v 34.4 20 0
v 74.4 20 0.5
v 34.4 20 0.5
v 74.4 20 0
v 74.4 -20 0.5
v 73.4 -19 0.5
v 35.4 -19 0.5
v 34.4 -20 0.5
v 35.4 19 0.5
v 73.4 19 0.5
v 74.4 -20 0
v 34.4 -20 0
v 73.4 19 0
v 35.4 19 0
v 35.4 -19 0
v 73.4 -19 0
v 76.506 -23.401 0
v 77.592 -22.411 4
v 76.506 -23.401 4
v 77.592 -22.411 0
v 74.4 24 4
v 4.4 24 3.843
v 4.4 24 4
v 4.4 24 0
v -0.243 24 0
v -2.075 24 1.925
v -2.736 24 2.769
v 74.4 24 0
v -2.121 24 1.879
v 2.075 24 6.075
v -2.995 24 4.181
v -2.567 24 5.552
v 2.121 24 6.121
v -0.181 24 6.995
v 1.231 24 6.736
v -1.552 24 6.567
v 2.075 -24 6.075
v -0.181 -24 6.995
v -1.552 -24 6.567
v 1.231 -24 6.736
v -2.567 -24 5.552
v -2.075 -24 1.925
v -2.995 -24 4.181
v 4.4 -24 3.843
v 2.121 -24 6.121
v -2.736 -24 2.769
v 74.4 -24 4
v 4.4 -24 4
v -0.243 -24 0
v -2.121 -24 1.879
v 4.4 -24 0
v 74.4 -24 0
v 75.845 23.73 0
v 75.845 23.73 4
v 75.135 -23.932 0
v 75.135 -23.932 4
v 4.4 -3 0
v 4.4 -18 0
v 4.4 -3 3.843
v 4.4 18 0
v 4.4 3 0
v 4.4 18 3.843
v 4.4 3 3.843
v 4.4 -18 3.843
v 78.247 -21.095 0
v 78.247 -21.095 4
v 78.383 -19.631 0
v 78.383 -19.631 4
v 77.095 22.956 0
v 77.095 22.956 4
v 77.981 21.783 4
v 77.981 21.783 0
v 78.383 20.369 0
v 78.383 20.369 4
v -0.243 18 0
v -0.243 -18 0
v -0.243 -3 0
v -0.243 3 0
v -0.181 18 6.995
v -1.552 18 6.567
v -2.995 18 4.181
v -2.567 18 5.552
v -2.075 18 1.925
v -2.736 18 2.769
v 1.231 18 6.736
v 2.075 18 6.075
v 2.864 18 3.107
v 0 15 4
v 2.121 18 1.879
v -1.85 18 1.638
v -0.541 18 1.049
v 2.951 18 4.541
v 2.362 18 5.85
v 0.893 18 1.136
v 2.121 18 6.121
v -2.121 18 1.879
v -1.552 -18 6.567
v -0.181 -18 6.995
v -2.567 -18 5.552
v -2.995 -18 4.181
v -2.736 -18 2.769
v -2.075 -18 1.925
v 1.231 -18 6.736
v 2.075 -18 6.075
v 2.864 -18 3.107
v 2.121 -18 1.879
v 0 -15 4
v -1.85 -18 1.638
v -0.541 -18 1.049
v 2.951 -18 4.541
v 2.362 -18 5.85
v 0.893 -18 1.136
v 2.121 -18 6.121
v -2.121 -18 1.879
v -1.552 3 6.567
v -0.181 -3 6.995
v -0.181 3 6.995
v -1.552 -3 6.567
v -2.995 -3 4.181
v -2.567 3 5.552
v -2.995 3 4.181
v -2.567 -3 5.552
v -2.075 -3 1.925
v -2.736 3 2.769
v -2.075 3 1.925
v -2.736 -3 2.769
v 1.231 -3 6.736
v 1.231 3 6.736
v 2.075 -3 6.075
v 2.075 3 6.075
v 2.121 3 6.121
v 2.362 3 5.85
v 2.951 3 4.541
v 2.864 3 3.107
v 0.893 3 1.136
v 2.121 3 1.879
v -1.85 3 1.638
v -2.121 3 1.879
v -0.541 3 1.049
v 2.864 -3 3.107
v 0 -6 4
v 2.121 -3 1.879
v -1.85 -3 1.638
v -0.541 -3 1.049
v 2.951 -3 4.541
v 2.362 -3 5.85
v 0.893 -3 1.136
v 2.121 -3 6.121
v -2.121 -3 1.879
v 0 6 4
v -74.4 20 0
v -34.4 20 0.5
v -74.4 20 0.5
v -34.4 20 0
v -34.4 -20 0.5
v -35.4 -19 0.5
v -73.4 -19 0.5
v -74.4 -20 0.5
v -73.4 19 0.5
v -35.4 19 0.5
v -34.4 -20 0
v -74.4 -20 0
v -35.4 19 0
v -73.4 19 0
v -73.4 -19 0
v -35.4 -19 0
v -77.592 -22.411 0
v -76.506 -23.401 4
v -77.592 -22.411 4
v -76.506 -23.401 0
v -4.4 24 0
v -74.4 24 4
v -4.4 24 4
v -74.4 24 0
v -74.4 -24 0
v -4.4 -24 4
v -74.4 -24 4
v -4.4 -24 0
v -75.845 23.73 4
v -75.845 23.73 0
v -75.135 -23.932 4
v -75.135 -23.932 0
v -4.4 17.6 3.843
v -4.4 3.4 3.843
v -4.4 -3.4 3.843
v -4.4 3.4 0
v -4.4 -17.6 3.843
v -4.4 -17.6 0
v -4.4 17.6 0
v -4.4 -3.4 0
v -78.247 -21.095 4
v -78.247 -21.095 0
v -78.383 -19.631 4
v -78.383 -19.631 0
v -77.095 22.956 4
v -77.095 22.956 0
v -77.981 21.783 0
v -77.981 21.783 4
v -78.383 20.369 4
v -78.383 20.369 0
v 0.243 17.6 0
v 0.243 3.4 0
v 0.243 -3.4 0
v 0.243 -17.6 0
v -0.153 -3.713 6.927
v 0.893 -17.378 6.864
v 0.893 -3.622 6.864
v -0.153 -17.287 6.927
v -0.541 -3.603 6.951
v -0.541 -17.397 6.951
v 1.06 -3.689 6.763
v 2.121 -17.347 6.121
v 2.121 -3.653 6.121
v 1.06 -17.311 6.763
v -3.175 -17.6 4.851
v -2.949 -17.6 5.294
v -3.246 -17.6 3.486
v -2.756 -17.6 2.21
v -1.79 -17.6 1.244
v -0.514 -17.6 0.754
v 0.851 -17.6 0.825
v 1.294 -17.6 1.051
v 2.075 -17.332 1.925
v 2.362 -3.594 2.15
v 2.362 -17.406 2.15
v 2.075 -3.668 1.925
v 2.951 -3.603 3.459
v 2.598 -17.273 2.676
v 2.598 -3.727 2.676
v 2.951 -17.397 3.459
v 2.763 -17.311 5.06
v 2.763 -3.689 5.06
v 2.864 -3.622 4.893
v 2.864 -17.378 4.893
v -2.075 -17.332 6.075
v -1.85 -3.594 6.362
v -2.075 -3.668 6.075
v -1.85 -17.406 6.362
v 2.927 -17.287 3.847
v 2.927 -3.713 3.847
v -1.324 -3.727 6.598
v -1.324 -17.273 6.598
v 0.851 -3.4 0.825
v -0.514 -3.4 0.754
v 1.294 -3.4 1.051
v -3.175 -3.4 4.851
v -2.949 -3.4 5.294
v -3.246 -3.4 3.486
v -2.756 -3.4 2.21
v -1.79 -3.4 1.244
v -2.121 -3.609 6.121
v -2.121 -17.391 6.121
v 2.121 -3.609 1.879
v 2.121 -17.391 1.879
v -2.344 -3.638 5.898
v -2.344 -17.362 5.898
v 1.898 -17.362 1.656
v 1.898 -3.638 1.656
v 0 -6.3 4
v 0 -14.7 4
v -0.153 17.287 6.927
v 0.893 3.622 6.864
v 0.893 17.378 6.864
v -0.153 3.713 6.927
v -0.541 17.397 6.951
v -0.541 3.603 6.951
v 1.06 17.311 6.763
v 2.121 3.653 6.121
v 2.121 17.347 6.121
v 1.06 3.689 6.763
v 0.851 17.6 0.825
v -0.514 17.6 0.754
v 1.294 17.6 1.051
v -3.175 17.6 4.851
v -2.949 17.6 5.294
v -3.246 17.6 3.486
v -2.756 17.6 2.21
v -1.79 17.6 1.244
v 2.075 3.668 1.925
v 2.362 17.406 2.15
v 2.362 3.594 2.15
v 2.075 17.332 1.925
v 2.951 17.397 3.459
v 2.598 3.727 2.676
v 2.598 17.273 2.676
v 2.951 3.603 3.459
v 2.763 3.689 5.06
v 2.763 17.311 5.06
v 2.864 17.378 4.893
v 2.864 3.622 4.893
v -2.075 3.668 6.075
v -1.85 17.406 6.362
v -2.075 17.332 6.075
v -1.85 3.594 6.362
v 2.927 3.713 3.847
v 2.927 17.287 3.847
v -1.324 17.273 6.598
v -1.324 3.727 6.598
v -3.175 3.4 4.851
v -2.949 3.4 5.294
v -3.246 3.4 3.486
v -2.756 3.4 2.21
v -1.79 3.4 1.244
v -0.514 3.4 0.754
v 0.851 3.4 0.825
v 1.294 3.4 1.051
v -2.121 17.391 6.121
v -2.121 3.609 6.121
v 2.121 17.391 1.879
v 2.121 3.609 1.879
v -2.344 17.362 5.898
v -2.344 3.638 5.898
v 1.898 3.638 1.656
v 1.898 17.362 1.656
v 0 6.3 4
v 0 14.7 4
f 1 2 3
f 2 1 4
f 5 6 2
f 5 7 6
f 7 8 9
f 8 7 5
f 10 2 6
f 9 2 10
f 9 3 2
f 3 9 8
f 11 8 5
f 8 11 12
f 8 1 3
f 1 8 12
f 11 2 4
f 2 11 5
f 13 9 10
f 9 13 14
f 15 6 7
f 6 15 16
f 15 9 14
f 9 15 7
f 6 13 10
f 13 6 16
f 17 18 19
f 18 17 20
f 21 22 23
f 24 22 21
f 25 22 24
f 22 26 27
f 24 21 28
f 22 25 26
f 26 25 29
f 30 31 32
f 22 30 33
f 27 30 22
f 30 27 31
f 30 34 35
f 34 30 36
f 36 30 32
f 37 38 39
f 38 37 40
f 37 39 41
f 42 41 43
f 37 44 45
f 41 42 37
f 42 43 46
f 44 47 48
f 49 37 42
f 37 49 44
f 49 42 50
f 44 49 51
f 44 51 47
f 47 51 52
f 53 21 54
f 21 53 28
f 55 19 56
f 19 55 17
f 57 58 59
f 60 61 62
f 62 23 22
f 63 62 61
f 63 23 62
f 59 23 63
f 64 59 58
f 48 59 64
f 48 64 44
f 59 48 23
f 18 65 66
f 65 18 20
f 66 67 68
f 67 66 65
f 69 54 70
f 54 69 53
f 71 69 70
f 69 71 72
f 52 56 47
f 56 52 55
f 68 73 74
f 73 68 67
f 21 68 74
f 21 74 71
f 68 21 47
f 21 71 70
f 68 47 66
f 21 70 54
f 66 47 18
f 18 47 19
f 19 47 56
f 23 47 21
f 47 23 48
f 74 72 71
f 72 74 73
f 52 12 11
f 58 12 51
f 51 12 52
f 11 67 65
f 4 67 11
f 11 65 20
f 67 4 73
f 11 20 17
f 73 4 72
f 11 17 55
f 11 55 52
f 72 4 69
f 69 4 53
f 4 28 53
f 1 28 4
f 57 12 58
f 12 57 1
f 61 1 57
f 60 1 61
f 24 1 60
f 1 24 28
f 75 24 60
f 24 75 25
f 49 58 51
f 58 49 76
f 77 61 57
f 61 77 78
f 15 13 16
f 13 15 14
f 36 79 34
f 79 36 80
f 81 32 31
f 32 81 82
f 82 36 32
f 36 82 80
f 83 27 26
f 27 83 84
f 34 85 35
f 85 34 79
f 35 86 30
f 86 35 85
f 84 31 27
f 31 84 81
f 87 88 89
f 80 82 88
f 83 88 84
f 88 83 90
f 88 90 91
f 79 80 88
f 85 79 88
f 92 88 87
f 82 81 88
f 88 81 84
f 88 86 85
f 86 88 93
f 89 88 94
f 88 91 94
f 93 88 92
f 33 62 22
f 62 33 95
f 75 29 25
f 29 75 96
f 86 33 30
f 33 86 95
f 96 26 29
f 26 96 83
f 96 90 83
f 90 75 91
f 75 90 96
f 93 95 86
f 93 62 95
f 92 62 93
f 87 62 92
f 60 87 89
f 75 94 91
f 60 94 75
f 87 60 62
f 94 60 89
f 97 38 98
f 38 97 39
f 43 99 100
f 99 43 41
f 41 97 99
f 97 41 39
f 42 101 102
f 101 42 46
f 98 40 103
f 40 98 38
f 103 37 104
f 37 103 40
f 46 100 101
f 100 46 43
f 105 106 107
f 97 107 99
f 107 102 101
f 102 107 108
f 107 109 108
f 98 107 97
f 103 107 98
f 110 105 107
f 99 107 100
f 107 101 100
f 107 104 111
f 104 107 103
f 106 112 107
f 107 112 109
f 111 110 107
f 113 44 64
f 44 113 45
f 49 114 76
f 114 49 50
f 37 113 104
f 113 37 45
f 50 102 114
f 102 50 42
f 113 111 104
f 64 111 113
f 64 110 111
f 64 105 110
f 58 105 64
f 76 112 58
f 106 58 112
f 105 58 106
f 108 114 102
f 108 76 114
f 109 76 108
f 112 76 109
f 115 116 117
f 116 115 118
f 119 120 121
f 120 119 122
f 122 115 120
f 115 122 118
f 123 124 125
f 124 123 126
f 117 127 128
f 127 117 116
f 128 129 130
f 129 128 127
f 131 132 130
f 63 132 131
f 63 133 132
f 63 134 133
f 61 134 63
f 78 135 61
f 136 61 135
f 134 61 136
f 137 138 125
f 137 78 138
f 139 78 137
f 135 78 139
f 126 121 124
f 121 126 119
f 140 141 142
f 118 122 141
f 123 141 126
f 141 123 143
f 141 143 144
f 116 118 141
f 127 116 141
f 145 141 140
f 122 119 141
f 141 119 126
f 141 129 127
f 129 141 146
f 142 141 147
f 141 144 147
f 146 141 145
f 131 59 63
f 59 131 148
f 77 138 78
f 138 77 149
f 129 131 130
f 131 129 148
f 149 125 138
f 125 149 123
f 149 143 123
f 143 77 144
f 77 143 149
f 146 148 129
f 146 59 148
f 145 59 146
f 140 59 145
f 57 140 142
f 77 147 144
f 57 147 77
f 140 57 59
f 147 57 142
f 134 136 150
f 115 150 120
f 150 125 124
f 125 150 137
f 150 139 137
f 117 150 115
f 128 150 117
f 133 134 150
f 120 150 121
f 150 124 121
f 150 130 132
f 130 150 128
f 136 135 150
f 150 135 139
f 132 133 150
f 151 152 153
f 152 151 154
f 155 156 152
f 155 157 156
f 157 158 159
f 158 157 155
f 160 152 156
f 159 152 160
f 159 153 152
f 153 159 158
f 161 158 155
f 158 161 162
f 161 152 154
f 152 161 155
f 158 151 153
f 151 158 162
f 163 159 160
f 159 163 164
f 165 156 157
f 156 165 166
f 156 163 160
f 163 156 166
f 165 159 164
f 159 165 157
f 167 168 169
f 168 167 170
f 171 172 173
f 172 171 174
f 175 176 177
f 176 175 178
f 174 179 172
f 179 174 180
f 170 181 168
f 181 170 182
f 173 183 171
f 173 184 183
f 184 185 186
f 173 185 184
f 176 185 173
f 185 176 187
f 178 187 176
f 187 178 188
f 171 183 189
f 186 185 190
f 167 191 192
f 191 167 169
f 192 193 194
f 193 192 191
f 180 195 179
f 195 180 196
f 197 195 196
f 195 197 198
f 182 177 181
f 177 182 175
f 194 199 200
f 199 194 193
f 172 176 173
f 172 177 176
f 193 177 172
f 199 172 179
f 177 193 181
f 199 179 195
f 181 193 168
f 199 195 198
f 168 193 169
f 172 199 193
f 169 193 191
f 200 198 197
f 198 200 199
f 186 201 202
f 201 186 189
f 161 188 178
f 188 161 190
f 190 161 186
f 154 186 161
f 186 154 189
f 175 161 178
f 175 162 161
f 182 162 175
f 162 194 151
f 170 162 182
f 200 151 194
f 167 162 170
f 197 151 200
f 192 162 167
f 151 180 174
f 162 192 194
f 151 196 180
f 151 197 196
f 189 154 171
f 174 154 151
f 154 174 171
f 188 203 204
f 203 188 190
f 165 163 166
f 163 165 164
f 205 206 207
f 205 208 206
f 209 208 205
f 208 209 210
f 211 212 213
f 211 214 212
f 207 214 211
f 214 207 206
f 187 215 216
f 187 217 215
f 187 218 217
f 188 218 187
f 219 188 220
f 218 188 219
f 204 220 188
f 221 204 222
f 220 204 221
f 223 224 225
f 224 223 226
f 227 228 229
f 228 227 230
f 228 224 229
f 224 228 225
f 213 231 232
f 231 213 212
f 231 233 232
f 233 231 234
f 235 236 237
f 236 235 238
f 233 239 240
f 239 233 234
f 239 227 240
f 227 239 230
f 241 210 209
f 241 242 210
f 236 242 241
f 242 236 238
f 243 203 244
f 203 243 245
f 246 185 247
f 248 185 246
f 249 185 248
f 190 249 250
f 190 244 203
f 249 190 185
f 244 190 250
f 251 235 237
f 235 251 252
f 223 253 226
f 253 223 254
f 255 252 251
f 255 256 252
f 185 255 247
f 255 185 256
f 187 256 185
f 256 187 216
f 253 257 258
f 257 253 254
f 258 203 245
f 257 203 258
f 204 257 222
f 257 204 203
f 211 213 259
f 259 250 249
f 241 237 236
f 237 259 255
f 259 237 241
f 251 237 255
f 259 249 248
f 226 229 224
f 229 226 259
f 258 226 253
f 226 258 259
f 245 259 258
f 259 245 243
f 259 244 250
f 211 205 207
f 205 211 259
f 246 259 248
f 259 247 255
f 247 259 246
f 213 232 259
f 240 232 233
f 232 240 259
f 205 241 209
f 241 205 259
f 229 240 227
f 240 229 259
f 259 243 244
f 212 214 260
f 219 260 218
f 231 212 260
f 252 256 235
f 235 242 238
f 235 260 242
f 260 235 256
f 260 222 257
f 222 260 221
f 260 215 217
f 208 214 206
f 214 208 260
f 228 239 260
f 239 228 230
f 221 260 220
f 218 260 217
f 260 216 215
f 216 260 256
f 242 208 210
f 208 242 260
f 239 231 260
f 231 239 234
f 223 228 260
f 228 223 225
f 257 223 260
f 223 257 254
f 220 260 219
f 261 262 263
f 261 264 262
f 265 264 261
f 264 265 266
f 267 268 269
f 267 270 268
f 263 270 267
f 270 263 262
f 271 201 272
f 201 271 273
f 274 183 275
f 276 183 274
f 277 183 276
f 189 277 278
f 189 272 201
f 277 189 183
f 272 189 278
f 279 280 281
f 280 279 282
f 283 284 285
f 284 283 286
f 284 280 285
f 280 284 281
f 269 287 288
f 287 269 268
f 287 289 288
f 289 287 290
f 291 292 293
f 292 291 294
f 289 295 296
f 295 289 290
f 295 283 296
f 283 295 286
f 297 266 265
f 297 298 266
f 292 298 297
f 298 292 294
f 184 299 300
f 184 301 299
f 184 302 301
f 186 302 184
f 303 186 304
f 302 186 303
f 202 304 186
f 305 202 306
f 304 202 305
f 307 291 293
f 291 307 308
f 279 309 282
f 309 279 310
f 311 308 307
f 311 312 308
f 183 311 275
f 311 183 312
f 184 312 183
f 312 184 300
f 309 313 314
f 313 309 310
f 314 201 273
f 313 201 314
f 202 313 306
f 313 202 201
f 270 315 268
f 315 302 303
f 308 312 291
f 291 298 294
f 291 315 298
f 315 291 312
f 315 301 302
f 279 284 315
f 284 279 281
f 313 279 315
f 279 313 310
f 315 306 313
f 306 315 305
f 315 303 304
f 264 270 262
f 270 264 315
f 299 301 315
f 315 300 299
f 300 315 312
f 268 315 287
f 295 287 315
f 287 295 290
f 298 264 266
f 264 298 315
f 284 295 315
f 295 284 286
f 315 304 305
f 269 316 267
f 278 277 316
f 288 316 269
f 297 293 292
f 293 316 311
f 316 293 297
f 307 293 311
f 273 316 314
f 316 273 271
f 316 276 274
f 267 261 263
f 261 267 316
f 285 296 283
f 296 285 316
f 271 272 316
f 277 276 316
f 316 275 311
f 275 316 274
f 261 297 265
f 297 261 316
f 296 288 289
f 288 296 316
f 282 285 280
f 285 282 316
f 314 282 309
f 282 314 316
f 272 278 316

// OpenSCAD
// [FL_INDEX: keywords="openscad, 3d_parametric, Customizable_Embossing_Stamp, csg_solid" | COT="Parametric OpenSCAD design from 3DCodeverse"]
// Title: Customizable Embossing Stamp

// preview[view:south, tilt:top]

/* [Global] */

// Load a 100x100 pixel image.(images will be stretched to fit) Simple, high contrast images work best. Make sure to click the Invert Colors checkbox!
image_file = "smile.dat"; // [image_surface:100x100]

// Where would you like the hinge in relation to your image?
hinge_placement = 1; // [1:top,2:left,3:bottom,4:right]

// What height would you like for the embossed area (mm)?
emboss_height = 1.5;

/* [Hidden] */
$fa = 6;
$fs = 1.5;
image_width = 40;
image_length = 40;
image_padding = 4;

handle_width = image_width + image_padding*2;
handle_length = 70;
handle_height = emboss_height+2.5;
nub = 3; // hinge size
tol = 0.4; // spacing between hinge pieces

assembly();

module assembly() {
    stamp_top(90*hinge_placement);
    stamp_bottom(90*hinge_placement);   
}

module stamp_top(rot=90) {
    translate([1,0,0])
    union() {
        difference () {
            translate([handle_length + nub + tol, -handle_width/2, 0])
                rotate([0,0,90]) handle();
            translate([handle_length-image_length/2+nub+tol,0,handle_height]) 
                rotate([0,180,rot]) plate();
        }
    
        // hinge
        translate([-1,handle_width/2-2*nub,handle_height]) hinge_m();
        mirror([0,1,0]) translate([-1,handle_width/2-2*nub,handle_height]) hinge_m();
        translate([-1,-nub,handle_height]) hinge_m();
        mirror([0,1,0]) translate([-1,-nub,handle_height]) hinge_m();
    }
}

module stamp_bottom(rot=90) {
    translate([-1,0,0])
    union() {
        translate([-handle_length + image_length/2-nub-tol,0,handle_height]) 
            rotate([0,0,-rot]) plate();
        mirror([1,0,0]) translate([handle_length + nub + tol, -handle_width/2, 0]) 
            rotate([0,0,90]) handle();
        
        // hinge
        translate([1,-nub-tol,handle_height]) hinge_f();
        mirror([0,1,0]) translate([1,-nub-tol,handle_height]) hinge_f();
    }
}

module handle() {
    difference() {
        hull() {
            cube([handle_width, handle_length, handle_height]);
            translate([image_padding,0,0]) cylinder(r=image_padding, h=handle_height);
            translate([handle_width-image_padding,0,0]) cylinder(r=image_padding, h=handle_height);
        }
        guide();
    }

}

module guide() {
    translate([image_padding,0,-.5]) 
    difference() {
        cube([image_width, image_length, 1]);
        translate([1,1,-0.5]) cube([image_width-2, image_length-2, 2]);
    }
}

module hinge_m() {
    difference () {
    	rotate([0,45,0]) union(){
            translate([0,0,-nub]) cube ([nub*3,nub*2, nub*2]);
            rotate([90,0,0]) {
                translate([0,0,-2*nub]) cylinder(r=nub,h=2*nub);
    		    cylinder(r1=nub,r2=0,h=nub);
            }
    	}
        translate([-nub,-nub/2,-handle_height-nub*5]) cube([nub*5, nub*3, nub*5]);
    }
}

module hinge_f() {
    len = handle_width/2 - 3*nub - 2*tol;
    
    difference() {
        rotate([90,-45,0]) 
        difference() {
            union() {
                cylinder(r=nub, h=len);
                translate([-3*nub,-nub,0]) cube([nub*3,nub*2,len]);
            }
            translate([0,0,-0.1]) cylinder(r1=nub+tol,r2=0,h=nub);
            translate([0,0,len-nub+0.1]) cylinder(r1=0,r2=nub+tol,h=nub);
        }
        translate([-nub*4,-len-nub/2,-handle_height-nub*5]) cube([nub*5, len+nub, nub*5]);
    }
}

module plate() {
    scale([(image_width)/100,(image_length)/100,emboss_height])
        surface(file=image_file, center=true, convexity=5);
}
